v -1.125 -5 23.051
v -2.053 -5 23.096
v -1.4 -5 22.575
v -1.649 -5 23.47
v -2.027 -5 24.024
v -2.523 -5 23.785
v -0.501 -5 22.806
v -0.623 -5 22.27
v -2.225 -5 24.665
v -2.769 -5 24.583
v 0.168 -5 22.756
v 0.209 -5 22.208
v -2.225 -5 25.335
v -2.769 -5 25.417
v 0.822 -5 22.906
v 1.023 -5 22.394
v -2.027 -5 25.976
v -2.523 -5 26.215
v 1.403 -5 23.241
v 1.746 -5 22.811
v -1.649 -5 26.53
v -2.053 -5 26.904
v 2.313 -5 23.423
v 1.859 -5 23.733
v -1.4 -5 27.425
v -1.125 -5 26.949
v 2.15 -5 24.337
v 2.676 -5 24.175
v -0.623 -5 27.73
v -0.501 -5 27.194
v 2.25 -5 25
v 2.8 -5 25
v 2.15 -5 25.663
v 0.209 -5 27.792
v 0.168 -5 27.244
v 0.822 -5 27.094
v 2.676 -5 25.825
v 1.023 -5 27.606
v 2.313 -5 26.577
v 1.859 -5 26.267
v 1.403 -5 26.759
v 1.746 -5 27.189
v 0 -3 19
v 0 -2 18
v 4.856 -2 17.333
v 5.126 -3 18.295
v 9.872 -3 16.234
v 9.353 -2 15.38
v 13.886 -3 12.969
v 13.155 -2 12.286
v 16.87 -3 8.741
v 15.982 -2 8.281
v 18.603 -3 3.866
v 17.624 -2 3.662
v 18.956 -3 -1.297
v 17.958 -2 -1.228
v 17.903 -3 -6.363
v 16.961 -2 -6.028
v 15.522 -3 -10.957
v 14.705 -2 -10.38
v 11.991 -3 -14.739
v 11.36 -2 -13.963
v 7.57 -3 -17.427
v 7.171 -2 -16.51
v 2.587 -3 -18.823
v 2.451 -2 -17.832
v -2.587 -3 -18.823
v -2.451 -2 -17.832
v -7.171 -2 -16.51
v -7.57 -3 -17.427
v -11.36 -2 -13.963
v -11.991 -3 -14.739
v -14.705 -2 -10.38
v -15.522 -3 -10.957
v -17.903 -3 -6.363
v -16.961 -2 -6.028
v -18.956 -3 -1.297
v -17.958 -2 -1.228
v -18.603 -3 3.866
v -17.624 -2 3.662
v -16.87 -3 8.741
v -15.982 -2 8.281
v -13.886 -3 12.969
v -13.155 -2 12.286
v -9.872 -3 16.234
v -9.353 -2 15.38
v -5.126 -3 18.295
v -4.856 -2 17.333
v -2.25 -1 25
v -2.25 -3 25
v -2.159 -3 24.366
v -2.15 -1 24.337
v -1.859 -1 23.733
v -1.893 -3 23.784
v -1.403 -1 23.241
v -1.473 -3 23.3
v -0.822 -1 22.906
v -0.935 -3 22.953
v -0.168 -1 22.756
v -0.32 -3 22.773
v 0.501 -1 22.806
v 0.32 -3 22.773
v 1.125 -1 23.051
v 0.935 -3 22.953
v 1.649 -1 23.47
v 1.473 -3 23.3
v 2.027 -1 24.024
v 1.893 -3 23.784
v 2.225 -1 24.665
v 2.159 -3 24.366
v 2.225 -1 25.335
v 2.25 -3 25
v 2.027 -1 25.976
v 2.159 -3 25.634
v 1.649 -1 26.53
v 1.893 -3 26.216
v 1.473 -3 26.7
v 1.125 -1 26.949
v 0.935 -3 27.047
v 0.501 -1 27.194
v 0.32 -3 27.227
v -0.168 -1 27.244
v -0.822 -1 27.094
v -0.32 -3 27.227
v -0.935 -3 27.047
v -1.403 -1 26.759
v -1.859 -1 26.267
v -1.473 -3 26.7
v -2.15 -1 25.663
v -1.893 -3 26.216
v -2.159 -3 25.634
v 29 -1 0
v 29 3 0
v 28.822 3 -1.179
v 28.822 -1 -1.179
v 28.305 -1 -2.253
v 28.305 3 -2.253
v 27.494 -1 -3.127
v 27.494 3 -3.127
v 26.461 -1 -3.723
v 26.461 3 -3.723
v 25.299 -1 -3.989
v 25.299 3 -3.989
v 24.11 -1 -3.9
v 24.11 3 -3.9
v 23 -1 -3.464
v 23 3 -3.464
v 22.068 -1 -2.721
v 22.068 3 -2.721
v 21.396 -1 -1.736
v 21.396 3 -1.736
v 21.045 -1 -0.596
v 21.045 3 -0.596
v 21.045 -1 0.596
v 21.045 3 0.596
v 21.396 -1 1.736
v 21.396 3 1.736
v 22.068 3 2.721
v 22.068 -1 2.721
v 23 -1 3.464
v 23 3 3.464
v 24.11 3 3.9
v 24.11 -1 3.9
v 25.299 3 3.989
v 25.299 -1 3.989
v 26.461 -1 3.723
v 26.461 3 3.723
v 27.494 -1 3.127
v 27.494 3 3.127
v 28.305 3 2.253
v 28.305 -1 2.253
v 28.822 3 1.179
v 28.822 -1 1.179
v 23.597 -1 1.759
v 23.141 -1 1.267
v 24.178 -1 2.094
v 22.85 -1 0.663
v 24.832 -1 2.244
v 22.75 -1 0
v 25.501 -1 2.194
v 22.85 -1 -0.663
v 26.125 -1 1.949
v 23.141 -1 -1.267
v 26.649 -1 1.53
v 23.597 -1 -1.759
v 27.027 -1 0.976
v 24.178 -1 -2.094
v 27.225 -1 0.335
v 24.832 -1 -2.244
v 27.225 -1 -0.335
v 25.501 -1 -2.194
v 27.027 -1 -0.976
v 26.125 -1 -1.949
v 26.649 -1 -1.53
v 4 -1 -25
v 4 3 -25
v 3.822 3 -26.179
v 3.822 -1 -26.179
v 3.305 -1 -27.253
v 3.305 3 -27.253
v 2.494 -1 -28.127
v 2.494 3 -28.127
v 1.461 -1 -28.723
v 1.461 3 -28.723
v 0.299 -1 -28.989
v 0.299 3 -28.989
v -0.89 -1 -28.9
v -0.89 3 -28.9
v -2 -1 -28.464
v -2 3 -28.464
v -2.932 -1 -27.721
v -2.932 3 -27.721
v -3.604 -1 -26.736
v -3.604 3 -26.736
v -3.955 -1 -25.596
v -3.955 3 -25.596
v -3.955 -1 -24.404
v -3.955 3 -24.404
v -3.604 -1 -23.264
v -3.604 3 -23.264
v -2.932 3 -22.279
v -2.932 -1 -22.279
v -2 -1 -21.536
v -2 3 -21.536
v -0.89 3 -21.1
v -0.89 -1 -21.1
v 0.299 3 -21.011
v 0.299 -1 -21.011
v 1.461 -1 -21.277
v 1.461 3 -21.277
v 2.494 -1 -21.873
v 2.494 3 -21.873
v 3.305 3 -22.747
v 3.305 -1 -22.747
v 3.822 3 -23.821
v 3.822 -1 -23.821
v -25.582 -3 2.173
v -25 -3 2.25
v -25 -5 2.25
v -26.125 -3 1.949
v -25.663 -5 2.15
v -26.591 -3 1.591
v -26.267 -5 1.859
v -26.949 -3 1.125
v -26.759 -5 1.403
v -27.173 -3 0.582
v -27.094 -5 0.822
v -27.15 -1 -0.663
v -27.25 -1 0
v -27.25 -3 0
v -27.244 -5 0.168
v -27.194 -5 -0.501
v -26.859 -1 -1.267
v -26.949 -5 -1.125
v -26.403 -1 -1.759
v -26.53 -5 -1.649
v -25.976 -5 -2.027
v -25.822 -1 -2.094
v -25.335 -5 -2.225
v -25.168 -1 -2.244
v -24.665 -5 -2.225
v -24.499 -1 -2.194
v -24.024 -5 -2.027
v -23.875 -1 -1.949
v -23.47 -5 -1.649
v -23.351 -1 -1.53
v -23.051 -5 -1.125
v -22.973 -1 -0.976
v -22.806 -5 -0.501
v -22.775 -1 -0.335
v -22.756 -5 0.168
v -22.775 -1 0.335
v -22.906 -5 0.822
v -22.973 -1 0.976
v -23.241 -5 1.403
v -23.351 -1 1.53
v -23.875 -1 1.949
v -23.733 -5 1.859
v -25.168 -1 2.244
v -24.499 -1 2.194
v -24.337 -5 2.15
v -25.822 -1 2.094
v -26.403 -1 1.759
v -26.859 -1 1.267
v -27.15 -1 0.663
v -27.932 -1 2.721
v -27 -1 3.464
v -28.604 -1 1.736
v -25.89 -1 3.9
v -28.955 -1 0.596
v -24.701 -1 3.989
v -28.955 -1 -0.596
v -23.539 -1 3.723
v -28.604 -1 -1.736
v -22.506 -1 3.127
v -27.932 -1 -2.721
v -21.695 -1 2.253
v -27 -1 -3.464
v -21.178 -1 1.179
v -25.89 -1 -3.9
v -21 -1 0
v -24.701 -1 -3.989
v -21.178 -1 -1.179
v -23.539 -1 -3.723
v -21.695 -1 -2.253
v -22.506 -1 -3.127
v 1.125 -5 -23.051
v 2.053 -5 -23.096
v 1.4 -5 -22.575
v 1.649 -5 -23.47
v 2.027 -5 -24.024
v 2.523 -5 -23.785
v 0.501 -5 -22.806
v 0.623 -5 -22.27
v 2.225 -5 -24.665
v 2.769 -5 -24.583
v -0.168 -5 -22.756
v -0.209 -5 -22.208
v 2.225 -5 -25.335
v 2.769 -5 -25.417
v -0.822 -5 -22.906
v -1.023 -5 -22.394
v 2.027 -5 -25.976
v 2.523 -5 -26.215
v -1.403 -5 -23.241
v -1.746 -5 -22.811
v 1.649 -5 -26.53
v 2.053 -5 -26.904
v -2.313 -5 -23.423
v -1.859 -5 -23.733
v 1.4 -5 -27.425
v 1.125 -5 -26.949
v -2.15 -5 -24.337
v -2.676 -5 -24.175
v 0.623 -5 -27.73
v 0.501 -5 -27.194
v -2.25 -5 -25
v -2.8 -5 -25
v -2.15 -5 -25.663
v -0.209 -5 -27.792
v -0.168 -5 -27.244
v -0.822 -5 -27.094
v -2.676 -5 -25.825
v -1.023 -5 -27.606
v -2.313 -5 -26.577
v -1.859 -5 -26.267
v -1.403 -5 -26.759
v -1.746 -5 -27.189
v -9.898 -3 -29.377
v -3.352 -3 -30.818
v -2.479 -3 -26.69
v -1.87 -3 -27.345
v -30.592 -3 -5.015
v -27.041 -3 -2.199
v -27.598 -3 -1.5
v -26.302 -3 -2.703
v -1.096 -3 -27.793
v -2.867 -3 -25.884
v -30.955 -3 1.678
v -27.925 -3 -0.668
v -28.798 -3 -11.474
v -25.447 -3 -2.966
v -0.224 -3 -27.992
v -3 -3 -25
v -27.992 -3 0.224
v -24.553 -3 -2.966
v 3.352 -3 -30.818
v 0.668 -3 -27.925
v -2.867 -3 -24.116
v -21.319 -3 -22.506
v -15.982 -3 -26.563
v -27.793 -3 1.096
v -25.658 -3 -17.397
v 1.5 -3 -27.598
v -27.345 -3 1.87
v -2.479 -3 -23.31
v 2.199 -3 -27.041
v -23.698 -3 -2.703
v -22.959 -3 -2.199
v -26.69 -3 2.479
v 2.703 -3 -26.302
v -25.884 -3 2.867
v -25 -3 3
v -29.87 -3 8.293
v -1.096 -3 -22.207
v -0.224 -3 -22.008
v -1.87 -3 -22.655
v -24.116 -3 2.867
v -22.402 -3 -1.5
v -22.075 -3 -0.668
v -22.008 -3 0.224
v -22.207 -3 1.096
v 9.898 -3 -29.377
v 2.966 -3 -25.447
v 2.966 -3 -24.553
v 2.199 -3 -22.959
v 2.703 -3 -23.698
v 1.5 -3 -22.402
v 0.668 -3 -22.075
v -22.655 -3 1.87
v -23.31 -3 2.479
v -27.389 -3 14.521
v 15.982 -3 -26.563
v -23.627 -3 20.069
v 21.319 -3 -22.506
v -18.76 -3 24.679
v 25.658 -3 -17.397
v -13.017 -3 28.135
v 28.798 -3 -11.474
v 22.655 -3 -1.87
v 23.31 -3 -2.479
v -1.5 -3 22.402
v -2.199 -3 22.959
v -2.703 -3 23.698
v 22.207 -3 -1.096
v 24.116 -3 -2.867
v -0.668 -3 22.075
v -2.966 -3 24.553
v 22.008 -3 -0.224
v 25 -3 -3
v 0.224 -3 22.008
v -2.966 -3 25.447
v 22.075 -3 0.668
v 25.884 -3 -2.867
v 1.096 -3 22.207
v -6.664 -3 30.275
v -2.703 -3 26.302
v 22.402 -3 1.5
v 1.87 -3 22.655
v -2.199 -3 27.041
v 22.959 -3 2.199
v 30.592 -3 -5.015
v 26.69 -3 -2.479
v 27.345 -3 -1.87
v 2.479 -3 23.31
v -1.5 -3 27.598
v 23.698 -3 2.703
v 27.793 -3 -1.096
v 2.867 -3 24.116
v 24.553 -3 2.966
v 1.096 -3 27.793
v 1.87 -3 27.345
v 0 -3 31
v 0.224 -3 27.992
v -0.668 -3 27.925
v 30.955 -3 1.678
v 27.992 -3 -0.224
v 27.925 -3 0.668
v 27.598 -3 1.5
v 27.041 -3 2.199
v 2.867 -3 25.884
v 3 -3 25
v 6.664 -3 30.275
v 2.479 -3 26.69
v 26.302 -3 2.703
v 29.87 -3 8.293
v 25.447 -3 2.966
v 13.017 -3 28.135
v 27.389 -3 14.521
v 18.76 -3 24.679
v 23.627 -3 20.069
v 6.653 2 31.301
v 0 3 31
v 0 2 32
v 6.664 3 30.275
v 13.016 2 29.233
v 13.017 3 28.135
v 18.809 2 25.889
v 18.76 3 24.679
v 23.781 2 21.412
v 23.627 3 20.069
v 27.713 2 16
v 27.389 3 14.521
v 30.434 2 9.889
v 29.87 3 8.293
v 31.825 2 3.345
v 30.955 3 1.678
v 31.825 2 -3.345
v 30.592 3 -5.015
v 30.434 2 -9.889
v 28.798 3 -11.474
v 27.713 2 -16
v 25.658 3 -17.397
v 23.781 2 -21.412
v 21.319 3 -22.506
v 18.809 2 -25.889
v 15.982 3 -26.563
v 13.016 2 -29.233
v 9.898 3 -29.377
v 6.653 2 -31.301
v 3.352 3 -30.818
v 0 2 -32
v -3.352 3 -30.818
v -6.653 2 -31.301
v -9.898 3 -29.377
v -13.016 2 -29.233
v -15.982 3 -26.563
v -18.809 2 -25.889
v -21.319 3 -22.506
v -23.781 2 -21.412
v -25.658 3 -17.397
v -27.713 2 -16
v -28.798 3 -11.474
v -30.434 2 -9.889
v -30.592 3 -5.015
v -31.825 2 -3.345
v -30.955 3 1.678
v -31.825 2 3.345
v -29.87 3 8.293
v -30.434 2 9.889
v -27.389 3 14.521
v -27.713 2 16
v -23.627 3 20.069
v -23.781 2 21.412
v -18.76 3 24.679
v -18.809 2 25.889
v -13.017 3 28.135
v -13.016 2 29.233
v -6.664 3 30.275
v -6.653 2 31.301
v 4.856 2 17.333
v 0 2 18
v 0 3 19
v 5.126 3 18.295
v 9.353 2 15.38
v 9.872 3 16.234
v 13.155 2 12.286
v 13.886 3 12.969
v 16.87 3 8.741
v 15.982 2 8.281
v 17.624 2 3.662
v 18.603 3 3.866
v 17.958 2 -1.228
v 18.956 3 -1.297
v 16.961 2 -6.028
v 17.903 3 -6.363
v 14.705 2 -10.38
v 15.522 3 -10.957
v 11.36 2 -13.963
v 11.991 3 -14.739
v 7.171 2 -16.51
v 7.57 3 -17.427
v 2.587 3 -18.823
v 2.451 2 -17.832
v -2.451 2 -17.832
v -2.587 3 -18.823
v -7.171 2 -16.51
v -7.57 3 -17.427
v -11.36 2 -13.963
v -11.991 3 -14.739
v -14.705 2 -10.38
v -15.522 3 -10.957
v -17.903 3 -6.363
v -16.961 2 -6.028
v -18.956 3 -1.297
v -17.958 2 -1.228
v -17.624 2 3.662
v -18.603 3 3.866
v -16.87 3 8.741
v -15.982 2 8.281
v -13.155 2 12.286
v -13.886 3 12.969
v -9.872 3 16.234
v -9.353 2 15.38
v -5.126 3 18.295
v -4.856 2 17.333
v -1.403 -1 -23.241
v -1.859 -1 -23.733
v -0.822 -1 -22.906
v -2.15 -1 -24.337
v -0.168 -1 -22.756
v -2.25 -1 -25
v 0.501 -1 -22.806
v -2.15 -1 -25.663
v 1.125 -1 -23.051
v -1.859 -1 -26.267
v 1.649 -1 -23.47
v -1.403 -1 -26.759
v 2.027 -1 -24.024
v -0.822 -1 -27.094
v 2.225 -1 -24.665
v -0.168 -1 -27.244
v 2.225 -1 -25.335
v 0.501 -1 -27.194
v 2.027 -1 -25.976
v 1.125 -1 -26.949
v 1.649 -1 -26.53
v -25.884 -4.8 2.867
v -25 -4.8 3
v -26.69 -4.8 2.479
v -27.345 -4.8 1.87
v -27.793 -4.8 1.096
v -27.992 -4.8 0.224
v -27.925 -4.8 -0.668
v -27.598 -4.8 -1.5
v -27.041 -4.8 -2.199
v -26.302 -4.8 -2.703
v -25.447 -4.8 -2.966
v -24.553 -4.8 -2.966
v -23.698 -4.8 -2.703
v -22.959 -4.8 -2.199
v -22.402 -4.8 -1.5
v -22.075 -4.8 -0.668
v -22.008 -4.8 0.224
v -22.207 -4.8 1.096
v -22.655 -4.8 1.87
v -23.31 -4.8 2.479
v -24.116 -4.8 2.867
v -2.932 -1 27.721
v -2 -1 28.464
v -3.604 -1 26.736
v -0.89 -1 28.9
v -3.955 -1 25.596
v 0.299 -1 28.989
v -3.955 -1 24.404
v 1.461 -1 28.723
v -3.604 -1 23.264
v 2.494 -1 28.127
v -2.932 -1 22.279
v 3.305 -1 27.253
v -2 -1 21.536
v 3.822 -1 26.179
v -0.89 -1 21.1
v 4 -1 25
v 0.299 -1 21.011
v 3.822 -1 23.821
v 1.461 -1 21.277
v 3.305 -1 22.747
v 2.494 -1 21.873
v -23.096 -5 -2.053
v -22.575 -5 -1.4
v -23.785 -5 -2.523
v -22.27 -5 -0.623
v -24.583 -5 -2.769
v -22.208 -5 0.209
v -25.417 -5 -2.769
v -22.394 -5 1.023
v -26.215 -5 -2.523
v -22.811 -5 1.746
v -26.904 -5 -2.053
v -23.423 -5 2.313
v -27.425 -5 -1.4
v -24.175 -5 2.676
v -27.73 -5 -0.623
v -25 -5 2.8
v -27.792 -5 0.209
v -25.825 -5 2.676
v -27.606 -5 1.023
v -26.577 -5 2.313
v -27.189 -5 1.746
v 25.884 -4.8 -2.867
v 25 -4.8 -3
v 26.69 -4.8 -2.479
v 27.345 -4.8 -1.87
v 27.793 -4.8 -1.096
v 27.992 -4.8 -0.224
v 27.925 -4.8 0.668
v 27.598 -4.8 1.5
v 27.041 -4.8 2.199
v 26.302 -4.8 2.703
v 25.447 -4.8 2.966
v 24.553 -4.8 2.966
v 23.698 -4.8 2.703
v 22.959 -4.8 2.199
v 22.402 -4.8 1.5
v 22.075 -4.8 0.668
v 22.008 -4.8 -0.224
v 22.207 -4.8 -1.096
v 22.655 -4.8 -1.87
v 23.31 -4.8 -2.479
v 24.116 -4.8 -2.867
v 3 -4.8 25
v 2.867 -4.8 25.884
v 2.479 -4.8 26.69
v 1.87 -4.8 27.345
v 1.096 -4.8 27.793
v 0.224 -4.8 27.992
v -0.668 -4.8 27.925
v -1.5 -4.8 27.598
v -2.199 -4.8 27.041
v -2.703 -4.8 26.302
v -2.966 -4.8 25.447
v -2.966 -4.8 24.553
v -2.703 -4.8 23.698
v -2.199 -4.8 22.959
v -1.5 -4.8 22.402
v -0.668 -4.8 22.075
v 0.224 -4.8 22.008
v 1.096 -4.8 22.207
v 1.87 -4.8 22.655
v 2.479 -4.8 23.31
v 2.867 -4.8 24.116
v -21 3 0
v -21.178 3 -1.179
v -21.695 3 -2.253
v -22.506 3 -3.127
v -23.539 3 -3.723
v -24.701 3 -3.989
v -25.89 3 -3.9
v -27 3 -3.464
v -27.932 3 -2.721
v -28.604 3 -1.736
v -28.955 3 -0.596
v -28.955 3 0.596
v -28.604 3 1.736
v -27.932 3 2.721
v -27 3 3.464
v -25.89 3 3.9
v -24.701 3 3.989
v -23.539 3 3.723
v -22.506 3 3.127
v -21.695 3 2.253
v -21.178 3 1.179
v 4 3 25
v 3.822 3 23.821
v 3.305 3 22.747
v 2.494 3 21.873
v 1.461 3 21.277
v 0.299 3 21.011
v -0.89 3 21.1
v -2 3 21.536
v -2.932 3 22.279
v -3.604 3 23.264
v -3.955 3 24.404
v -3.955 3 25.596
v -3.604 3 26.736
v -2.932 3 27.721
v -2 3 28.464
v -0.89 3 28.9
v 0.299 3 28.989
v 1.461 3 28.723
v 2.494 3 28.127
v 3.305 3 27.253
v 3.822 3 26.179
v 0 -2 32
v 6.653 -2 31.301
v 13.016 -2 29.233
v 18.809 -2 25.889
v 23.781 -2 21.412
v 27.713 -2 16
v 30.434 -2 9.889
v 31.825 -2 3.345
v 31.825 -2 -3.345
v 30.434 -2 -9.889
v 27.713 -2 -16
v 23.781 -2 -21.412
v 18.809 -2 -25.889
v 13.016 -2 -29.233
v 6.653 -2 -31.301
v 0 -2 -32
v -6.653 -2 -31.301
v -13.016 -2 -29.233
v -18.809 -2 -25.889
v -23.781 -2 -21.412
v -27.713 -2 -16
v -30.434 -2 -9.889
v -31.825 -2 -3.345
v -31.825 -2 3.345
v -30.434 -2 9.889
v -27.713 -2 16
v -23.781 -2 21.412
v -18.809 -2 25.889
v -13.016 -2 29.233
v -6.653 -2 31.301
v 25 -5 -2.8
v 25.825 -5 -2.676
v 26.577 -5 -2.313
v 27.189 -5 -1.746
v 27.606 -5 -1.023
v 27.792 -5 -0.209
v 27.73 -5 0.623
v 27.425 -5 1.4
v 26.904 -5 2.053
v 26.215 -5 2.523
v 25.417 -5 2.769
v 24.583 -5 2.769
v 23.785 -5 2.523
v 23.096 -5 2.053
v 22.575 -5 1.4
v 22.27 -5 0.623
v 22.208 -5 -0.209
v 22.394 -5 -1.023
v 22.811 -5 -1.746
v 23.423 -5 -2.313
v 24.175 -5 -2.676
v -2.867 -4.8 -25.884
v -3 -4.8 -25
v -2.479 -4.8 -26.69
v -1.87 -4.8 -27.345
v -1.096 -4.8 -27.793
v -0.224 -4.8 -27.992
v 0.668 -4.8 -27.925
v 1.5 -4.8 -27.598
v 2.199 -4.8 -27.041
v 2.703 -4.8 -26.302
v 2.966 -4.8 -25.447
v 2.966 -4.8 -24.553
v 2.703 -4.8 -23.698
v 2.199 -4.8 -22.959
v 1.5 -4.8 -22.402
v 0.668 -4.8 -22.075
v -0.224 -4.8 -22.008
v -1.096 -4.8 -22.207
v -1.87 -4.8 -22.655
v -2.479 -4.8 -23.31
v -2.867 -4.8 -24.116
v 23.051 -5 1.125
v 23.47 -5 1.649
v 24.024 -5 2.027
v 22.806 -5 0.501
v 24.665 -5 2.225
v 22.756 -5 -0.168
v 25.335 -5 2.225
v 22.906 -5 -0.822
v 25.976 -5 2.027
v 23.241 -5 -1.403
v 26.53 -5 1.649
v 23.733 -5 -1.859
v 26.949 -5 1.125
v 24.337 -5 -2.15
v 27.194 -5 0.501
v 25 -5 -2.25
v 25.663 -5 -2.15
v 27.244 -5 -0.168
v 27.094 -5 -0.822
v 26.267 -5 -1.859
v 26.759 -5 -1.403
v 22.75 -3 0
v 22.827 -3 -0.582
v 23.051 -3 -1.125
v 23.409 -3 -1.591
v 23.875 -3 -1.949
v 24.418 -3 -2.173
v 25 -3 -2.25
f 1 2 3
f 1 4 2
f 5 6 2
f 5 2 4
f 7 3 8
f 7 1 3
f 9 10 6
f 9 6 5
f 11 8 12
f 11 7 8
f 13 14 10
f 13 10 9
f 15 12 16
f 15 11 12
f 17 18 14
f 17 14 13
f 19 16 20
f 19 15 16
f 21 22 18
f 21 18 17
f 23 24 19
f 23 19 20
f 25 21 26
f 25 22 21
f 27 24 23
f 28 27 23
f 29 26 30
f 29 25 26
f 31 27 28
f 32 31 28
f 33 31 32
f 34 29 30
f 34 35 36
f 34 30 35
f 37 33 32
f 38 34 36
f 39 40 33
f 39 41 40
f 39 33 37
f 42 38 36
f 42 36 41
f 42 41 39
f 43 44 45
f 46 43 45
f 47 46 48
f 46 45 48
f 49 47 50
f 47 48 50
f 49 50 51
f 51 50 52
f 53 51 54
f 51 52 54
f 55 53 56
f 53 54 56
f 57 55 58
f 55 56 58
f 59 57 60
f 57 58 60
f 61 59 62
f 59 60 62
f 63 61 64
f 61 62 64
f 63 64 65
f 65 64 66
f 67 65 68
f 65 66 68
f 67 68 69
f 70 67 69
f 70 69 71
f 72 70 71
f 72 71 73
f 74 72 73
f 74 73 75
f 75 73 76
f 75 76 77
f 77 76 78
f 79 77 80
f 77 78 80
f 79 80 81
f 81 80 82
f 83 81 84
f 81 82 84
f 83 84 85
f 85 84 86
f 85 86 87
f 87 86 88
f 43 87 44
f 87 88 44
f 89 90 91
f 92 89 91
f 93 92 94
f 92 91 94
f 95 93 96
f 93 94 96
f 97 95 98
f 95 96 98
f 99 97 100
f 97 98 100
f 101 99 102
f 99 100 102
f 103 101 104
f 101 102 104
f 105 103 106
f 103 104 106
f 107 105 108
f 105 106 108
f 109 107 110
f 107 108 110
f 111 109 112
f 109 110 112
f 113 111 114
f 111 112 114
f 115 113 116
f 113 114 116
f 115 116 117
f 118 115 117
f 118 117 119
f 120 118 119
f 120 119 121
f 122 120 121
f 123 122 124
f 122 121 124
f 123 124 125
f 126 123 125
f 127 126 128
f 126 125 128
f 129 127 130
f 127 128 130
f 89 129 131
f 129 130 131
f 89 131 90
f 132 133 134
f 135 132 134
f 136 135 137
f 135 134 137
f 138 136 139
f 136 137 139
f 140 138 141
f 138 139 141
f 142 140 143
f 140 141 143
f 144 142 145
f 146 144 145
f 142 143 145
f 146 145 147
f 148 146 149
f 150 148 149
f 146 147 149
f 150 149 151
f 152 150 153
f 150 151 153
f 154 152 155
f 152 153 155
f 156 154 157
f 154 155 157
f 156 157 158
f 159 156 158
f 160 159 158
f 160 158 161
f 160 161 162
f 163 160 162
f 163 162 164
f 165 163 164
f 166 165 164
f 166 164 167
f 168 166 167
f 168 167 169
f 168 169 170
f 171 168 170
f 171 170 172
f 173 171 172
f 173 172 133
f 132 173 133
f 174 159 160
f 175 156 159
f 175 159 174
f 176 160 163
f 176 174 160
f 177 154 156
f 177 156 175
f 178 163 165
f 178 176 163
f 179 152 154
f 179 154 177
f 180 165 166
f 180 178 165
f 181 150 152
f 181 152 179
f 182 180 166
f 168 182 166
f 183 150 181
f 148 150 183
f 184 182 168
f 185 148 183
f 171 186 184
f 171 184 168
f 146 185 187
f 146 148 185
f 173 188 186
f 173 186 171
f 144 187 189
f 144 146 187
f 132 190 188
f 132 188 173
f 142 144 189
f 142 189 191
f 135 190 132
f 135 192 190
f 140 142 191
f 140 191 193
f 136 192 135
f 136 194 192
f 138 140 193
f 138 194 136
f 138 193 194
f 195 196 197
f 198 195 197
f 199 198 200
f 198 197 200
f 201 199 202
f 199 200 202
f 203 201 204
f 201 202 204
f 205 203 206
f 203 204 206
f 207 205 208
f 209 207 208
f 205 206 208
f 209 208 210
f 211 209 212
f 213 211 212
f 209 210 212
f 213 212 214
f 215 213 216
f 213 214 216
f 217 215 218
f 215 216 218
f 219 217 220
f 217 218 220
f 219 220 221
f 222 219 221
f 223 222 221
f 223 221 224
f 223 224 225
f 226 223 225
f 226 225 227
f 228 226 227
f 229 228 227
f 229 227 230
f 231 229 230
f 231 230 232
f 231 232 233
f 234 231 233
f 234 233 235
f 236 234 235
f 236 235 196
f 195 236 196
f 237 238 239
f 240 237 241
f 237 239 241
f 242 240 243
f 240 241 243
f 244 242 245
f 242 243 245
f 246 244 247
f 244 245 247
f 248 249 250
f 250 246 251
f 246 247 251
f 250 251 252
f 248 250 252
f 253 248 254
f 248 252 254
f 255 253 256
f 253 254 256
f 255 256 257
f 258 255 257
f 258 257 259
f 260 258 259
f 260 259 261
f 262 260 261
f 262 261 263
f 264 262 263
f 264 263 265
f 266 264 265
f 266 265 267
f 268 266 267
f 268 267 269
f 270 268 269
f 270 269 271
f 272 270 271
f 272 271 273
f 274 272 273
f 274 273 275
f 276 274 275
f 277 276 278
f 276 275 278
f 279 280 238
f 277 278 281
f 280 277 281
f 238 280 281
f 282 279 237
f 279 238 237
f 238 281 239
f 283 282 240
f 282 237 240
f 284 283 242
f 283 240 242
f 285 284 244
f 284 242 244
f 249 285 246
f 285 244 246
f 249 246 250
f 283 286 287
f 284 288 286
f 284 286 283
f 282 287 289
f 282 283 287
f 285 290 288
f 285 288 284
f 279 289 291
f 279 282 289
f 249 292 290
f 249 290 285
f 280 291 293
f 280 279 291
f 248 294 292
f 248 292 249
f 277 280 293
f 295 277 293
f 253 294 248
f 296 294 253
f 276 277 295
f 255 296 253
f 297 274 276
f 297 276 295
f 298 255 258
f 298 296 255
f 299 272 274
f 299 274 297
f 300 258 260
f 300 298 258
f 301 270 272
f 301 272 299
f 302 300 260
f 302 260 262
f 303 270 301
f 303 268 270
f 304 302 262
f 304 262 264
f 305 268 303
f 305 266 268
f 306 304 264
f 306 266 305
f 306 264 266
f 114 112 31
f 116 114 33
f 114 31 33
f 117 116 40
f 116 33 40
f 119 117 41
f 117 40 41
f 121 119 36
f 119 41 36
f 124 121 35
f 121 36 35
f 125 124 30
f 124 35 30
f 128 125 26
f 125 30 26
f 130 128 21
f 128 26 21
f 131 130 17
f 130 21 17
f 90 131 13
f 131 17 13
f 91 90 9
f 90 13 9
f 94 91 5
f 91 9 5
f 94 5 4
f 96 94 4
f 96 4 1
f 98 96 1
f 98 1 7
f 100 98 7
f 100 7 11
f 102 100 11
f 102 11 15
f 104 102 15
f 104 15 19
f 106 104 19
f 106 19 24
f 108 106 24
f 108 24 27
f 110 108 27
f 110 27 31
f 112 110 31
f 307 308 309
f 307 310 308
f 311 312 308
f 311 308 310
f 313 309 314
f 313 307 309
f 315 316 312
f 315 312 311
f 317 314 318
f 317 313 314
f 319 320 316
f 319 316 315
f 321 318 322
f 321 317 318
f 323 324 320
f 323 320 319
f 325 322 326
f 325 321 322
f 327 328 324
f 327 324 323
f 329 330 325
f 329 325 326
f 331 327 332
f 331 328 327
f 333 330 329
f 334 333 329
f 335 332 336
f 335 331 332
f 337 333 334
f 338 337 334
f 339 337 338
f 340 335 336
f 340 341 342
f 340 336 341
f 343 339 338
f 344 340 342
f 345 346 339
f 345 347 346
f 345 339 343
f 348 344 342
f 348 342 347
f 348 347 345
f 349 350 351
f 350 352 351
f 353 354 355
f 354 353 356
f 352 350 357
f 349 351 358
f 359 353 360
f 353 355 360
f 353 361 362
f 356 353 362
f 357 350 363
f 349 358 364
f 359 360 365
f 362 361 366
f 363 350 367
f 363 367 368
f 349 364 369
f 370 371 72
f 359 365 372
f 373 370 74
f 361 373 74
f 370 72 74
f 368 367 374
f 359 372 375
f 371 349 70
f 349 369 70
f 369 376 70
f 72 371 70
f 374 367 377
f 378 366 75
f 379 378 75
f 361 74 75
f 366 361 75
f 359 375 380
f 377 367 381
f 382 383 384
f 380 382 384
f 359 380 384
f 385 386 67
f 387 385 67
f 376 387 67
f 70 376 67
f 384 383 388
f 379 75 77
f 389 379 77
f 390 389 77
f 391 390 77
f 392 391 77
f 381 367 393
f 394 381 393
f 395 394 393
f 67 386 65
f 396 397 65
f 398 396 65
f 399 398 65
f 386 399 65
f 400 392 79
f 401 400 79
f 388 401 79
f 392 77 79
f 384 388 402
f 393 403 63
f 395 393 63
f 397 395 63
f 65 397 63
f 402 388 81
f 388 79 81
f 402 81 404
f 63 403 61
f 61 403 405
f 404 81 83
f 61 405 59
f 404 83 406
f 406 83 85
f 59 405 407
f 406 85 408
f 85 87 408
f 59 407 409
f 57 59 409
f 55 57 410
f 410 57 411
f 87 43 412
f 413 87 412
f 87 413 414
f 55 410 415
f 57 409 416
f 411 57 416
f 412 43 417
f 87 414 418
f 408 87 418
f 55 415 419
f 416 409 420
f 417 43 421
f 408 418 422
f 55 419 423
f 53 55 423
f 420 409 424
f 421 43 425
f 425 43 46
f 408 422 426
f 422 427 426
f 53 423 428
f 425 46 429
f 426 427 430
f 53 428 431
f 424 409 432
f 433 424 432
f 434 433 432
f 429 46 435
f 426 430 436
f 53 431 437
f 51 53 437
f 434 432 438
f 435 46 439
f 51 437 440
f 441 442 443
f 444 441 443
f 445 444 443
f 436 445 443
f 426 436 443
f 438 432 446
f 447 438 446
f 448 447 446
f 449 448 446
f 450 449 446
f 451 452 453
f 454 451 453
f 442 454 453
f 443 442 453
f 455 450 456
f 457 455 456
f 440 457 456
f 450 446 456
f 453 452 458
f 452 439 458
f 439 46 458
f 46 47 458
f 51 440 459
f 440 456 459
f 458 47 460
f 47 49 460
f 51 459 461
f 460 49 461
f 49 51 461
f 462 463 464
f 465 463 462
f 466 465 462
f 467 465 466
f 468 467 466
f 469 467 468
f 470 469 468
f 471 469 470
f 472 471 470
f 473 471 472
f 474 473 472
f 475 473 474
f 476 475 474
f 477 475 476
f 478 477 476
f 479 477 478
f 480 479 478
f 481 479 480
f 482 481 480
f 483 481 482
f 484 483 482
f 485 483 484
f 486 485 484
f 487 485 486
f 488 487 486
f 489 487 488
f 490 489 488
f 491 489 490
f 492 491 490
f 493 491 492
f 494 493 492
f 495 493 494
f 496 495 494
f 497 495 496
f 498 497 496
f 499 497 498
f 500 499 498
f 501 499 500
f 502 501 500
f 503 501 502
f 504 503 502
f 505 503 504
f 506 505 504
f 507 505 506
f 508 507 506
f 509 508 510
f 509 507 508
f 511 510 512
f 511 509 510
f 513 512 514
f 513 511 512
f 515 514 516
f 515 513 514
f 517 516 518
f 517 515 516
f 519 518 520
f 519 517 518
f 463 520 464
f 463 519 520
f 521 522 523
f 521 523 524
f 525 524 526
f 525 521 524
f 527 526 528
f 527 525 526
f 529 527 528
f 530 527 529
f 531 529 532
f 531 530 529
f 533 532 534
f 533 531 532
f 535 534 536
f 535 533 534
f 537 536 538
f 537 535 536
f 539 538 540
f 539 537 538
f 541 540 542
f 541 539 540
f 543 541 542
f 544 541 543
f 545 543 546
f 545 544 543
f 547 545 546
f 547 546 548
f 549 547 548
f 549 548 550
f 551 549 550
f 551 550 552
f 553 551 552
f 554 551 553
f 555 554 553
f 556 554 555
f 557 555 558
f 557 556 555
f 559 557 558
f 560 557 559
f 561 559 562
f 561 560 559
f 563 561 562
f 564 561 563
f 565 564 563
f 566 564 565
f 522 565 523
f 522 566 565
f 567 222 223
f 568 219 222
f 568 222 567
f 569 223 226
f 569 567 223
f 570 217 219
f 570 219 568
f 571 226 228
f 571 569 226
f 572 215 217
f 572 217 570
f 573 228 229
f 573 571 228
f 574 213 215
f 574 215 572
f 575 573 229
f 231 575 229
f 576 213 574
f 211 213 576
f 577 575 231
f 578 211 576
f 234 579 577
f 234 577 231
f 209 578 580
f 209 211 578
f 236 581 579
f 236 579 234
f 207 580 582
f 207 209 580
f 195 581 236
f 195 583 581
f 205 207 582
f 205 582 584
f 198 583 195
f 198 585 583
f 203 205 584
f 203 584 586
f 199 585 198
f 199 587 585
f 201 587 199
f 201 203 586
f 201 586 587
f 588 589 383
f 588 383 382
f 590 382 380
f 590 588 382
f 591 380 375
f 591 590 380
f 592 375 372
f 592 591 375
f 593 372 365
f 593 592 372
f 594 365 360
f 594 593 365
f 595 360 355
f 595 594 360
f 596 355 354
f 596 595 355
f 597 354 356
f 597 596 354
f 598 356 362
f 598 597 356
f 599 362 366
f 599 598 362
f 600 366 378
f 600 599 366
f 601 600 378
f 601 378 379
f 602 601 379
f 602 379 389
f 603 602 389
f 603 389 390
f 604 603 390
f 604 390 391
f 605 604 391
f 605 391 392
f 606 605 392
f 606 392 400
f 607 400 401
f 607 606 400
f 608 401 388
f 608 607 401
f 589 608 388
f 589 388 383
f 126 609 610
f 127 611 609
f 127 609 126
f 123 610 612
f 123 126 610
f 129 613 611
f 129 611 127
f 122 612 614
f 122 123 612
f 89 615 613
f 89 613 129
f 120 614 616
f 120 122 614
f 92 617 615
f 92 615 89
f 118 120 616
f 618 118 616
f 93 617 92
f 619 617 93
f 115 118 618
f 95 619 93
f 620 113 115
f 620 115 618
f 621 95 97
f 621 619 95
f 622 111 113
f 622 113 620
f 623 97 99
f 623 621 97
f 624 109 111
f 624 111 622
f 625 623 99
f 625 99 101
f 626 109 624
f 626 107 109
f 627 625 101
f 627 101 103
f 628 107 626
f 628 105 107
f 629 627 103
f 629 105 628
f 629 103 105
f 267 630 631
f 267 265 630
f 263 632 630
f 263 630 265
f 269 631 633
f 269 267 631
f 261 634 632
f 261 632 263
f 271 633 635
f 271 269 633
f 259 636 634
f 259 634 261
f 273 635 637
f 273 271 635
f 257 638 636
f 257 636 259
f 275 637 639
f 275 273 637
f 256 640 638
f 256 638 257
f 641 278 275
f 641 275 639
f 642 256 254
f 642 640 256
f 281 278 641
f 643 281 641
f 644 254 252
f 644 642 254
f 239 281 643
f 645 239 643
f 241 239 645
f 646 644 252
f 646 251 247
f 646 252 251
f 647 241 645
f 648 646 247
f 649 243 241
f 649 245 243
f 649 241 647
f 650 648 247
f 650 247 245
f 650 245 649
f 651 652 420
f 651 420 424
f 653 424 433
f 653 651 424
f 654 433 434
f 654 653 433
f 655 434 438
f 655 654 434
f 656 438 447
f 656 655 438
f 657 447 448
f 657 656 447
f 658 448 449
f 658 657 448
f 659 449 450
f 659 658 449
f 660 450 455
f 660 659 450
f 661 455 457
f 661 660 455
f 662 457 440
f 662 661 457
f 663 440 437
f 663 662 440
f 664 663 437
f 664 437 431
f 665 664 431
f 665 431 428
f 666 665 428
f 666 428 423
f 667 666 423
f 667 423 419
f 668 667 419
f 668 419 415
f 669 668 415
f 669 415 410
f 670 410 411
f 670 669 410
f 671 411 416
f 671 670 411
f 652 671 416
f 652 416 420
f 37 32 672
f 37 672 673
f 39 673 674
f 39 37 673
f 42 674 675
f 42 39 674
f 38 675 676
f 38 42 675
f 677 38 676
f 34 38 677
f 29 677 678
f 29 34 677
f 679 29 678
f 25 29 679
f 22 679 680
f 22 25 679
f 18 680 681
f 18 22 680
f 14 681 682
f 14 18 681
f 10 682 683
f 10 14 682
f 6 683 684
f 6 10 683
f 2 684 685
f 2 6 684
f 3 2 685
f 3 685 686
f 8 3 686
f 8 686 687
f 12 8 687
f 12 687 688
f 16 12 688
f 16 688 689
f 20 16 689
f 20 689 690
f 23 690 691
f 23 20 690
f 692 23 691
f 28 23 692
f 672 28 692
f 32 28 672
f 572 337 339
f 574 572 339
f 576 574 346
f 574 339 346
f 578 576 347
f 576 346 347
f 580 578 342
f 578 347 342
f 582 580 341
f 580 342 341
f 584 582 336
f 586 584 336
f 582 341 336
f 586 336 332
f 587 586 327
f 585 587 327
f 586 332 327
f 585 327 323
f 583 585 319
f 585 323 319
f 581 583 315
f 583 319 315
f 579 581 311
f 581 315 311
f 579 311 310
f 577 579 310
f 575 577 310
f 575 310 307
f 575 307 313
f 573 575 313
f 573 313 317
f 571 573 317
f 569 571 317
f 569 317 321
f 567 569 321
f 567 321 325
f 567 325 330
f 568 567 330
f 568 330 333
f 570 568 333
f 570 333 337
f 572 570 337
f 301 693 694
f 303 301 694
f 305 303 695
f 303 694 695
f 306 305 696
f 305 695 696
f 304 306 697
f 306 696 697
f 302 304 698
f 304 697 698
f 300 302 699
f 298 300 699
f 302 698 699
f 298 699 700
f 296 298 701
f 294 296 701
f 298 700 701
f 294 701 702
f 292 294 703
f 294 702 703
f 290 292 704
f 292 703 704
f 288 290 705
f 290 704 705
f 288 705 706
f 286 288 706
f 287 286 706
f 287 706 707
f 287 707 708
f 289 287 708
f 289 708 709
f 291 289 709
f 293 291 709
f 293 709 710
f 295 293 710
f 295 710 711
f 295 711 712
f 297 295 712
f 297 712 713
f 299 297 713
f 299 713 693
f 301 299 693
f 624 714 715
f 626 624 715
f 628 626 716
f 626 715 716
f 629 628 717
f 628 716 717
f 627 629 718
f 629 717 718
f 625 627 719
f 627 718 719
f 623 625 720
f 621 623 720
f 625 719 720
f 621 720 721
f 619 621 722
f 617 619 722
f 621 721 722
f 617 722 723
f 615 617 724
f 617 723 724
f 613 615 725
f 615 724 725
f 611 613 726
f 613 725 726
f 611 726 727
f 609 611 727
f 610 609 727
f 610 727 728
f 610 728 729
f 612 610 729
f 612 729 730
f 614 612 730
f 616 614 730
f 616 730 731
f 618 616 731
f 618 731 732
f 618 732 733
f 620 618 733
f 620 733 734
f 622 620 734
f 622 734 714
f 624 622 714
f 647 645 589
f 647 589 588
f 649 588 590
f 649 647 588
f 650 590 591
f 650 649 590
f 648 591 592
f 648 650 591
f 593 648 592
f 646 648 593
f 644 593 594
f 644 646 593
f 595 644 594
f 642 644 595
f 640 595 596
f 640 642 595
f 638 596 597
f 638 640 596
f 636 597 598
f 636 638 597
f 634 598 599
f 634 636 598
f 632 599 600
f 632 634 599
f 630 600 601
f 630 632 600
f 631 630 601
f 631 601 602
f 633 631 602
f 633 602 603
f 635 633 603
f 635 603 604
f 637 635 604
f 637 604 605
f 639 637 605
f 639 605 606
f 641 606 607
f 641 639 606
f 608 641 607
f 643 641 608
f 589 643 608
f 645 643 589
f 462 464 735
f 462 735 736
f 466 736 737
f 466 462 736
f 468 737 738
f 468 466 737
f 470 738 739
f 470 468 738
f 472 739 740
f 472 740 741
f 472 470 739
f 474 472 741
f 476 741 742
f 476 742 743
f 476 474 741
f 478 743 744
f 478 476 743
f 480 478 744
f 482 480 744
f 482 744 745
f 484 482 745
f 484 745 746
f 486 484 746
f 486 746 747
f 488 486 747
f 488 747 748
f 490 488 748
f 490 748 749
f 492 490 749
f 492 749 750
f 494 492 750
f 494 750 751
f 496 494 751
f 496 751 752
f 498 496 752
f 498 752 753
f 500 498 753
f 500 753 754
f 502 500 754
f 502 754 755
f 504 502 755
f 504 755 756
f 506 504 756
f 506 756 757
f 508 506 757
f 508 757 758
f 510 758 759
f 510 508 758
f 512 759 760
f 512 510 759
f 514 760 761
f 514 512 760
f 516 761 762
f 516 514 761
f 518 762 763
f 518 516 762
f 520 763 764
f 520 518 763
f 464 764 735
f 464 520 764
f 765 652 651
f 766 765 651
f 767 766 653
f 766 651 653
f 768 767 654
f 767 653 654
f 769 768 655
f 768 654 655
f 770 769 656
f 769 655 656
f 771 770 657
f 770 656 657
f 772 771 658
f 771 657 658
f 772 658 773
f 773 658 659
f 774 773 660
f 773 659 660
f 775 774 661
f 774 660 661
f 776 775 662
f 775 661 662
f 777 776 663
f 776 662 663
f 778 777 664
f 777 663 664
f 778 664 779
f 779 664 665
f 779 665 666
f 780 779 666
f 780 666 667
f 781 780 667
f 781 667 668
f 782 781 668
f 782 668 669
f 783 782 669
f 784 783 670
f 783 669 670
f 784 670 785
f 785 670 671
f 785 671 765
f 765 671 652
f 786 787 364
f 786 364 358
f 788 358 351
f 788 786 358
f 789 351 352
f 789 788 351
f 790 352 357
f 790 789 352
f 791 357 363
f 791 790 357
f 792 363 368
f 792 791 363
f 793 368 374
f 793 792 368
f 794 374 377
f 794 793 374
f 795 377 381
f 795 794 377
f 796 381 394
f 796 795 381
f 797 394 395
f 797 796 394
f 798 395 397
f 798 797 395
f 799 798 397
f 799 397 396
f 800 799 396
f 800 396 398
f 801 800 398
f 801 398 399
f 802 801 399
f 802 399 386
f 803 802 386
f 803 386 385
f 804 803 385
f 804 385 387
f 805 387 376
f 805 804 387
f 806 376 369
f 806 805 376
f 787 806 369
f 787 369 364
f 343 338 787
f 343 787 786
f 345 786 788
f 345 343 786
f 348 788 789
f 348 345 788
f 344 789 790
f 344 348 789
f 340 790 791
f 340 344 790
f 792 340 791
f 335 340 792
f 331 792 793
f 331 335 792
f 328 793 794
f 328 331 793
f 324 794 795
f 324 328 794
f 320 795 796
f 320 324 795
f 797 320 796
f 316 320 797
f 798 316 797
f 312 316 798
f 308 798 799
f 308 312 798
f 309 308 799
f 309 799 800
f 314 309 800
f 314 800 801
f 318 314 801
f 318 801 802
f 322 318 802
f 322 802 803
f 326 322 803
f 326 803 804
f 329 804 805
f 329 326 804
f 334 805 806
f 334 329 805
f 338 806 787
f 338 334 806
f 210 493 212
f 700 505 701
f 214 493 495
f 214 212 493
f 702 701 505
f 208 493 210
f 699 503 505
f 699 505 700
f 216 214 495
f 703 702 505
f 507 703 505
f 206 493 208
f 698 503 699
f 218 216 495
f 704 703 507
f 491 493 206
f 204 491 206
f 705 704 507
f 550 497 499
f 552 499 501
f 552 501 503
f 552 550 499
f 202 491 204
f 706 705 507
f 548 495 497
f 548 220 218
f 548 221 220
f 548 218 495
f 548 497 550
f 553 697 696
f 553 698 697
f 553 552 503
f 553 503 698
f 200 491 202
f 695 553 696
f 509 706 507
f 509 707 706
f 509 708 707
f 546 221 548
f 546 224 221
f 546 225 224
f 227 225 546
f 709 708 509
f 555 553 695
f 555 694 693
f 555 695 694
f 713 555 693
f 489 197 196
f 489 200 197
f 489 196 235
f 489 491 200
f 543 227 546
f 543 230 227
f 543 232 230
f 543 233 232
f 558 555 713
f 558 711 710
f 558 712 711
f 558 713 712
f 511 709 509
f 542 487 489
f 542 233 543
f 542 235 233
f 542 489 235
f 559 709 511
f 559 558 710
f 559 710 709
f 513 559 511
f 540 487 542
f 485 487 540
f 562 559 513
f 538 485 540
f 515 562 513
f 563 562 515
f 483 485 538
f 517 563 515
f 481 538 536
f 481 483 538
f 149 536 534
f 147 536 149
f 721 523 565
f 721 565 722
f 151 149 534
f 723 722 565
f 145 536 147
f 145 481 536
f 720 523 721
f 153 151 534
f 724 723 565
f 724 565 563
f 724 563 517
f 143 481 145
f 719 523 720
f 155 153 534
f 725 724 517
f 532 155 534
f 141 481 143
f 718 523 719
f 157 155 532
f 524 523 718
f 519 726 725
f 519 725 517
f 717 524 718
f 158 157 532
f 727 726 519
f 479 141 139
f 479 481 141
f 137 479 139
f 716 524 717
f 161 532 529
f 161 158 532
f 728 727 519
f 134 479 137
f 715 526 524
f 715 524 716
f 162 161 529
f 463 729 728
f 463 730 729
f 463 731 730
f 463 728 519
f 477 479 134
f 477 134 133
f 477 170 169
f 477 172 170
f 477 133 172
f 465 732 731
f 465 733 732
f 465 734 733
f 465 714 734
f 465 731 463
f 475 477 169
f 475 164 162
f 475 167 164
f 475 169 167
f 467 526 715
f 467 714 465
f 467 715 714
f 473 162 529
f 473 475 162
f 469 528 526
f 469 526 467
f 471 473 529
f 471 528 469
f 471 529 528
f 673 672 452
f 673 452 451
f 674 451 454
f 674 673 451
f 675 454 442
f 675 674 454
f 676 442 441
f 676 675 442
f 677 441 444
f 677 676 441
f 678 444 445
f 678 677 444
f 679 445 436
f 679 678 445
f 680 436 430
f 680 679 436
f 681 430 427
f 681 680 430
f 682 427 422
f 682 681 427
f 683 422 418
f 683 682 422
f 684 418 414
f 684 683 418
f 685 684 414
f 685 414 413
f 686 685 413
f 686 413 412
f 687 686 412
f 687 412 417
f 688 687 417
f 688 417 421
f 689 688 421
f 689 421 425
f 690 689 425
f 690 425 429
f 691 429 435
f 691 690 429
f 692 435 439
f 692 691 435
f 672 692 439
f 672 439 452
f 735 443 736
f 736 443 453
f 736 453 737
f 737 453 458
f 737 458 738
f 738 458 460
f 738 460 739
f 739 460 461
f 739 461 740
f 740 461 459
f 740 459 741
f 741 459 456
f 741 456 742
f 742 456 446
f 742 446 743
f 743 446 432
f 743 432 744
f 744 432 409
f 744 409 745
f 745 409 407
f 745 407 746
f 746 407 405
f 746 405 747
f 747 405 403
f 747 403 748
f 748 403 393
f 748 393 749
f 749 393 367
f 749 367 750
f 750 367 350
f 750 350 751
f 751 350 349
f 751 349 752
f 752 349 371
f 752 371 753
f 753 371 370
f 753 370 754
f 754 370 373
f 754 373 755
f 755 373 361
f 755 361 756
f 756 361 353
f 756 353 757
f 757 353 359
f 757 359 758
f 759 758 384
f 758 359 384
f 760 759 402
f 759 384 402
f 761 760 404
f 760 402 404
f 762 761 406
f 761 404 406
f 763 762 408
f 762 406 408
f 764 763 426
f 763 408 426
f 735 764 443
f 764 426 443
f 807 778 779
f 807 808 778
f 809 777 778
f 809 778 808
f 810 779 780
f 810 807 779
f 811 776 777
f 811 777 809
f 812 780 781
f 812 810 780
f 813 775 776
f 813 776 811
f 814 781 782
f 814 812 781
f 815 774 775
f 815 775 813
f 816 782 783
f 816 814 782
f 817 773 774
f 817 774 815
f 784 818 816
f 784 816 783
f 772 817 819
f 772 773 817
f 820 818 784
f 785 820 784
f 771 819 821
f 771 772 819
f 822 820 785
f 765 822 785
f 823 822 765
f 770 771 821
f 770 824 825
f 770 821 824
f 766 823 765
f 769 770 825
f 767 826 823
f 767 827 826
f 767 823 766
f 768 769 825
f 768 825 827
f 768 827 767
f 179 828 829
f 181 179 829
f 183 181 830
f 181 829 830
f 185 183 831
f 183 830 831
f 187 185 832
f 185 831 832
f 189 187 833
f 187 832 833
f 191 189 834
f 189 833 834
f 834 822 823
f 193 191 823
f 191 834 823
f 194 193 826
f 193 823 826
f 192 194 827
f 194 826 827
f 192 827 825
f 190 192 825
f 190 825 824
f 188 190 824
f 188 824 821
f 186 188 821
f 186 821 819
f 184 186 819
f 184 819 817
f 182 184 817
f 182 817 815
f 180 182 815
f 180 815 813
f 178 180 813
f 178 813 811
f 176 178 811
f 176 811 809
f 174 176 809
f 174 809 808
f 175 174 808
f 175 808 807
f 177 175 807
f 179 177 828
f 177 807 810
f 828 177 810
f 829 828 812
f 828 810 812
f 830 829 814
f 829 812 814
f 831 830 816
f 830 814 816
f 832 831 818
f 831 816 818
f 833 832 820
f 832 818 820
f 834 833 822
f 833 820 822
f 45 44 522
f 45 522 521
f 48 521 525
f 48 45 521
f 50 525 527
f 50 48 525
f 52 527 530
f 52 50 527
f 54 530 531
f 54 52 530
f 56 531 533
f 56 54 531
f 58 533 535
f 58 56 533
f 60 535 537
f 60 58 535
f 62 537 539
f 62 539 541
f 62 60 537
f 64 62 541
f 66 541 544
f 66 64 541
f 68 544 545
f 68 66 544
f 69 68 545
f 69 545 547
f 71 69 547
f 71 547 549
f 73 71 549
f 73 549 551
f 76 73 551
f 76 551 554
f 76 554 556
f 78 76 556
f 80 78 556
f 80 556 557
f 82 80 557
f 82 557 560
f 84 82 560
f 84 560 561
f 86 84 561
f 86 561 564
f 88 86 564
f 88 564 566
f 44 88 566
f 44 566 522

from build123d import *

# Parameters (mm, degrees)
SKETCH1_R                      = 32
SKETCH1_R_2                    = 18
BOSS_EXTRUDE1_DEPTH            = 3
CBORE_FOR_M4_SHCS1_D           = 4.5
CBORE_FOR_M4_SHCS1_CBORE_D     = 8
CBORE_FOR_M4_SHCS1_CBORE_DEPTH = 4
CHAMFER1_SIZE                  = 1
BOSS_EXTRUDE2_START            = 2
SKETCH4_R                      = 3
SKETCH4_R_2                    = 2.25
BOSS_EXTRUDE2_DEPTH            = 2
CHAMFER2_SIZE                  = 0.2
CIRPATTERN1_COUNT              = 4
CHAMFER2_OF_CIRPATTERN1_SIZE   = 0.2


with BuildPart() as part:
    # Sketch1 → Boss-Extrude1 (new, symmetric)
    with BuildSketch(Plane(origin=(0, 0, 0), x_dir=(1, 0, 0), z_dir=(0, 1, 0))):
        with Locations(Location((0, 0, 0), (0, 0, 270))):
            Circle(SKETCH1_R)
        with Locations(Location((0, 0, 0), (0, 0, 270))):
            Circle(SKETCH1_R_2, mode=Mode.SUBTRACT)
    extrude(amount=BOSS_EXTRUDE1_DEPTH, both=True)

    # CBORE for M4 SHCS1 (through all)
    with Locations(Plane(origin=(0, 3, 0), x_dir=(1, 0, 0), z_dir=(0, 1, 0))):
        with Locations((-25, 0), (0, 25), (25, 0), (0, -25)):
            CounterBoreHole(CBORE_FOR_M4_SHCS1_D / 2, CBORE_FOR_M4_SHCS1_CBORE_D / 2, CBORE_FOR_M4_SHCS1_CBORE_DEPTH)

    # Chamfer1
    chamfer1_edges = [part.edges().sort_by_distance(p)[0] for p in [
        (0, -3, -32),
        (0, 3, -32),
        (0, -3, -18),
        (0, 3, -18),
    ]]
    chamfer(chamfer1_edges, length=CHAMFER1_SIZE)

    # Sketch4 → Boss-Extrude2 (add)
    with BuildSketch(Plane.XZ.offset(3).offset(BOSS_EXTRUDE2_START)):
        with Locations(Location((-25, 0, 0), (0, 0, 90))):
            Circle(SKETCH4_R)
        with Locations(Location((-25, 0, 0), (0, 0, 90))):
            Circle(SKETCH4_R_2, mode=Mode.SUBTRACT)
    boss_extrude2 = extrude(amount=-BOSS_EXTRUDE2_DEPTH)

    # Chamfer2
    chamfer2_edges = [part.edges().sort_by_distance(p)[0] for p in [
        (-25, -5, -3),
    ]]
    chamfer(chamfer2_edges, length=CHAMFER2_SIZE)

    # CirPattern1: Boss-Extrude2 ×4 about axis
    cirpattern1_axis = Axis((0, 0, 0), (0, 1, 0))
    for i in range(1, CIRPATTERN1_COUNT):
        add(boss_extrude2.rotate(cirpattern1_axis, i * 360 / CIRPATTERN1_COUNT))

    # Chamfer2 of CirPattern1
    chamfer2_of_cirpattern1_edges = [part.edges().sort_by_distance(p)[0] for p in [
        (-3, -5, 25),
        (25, -5, 3),
        (3, -5, -25),
    ]]
    chamfer(chamfer2_of_cirpattern1_edges, length=CHAMFER2_OF_CIRPATTERN1_SIZE)


solid = part.part
